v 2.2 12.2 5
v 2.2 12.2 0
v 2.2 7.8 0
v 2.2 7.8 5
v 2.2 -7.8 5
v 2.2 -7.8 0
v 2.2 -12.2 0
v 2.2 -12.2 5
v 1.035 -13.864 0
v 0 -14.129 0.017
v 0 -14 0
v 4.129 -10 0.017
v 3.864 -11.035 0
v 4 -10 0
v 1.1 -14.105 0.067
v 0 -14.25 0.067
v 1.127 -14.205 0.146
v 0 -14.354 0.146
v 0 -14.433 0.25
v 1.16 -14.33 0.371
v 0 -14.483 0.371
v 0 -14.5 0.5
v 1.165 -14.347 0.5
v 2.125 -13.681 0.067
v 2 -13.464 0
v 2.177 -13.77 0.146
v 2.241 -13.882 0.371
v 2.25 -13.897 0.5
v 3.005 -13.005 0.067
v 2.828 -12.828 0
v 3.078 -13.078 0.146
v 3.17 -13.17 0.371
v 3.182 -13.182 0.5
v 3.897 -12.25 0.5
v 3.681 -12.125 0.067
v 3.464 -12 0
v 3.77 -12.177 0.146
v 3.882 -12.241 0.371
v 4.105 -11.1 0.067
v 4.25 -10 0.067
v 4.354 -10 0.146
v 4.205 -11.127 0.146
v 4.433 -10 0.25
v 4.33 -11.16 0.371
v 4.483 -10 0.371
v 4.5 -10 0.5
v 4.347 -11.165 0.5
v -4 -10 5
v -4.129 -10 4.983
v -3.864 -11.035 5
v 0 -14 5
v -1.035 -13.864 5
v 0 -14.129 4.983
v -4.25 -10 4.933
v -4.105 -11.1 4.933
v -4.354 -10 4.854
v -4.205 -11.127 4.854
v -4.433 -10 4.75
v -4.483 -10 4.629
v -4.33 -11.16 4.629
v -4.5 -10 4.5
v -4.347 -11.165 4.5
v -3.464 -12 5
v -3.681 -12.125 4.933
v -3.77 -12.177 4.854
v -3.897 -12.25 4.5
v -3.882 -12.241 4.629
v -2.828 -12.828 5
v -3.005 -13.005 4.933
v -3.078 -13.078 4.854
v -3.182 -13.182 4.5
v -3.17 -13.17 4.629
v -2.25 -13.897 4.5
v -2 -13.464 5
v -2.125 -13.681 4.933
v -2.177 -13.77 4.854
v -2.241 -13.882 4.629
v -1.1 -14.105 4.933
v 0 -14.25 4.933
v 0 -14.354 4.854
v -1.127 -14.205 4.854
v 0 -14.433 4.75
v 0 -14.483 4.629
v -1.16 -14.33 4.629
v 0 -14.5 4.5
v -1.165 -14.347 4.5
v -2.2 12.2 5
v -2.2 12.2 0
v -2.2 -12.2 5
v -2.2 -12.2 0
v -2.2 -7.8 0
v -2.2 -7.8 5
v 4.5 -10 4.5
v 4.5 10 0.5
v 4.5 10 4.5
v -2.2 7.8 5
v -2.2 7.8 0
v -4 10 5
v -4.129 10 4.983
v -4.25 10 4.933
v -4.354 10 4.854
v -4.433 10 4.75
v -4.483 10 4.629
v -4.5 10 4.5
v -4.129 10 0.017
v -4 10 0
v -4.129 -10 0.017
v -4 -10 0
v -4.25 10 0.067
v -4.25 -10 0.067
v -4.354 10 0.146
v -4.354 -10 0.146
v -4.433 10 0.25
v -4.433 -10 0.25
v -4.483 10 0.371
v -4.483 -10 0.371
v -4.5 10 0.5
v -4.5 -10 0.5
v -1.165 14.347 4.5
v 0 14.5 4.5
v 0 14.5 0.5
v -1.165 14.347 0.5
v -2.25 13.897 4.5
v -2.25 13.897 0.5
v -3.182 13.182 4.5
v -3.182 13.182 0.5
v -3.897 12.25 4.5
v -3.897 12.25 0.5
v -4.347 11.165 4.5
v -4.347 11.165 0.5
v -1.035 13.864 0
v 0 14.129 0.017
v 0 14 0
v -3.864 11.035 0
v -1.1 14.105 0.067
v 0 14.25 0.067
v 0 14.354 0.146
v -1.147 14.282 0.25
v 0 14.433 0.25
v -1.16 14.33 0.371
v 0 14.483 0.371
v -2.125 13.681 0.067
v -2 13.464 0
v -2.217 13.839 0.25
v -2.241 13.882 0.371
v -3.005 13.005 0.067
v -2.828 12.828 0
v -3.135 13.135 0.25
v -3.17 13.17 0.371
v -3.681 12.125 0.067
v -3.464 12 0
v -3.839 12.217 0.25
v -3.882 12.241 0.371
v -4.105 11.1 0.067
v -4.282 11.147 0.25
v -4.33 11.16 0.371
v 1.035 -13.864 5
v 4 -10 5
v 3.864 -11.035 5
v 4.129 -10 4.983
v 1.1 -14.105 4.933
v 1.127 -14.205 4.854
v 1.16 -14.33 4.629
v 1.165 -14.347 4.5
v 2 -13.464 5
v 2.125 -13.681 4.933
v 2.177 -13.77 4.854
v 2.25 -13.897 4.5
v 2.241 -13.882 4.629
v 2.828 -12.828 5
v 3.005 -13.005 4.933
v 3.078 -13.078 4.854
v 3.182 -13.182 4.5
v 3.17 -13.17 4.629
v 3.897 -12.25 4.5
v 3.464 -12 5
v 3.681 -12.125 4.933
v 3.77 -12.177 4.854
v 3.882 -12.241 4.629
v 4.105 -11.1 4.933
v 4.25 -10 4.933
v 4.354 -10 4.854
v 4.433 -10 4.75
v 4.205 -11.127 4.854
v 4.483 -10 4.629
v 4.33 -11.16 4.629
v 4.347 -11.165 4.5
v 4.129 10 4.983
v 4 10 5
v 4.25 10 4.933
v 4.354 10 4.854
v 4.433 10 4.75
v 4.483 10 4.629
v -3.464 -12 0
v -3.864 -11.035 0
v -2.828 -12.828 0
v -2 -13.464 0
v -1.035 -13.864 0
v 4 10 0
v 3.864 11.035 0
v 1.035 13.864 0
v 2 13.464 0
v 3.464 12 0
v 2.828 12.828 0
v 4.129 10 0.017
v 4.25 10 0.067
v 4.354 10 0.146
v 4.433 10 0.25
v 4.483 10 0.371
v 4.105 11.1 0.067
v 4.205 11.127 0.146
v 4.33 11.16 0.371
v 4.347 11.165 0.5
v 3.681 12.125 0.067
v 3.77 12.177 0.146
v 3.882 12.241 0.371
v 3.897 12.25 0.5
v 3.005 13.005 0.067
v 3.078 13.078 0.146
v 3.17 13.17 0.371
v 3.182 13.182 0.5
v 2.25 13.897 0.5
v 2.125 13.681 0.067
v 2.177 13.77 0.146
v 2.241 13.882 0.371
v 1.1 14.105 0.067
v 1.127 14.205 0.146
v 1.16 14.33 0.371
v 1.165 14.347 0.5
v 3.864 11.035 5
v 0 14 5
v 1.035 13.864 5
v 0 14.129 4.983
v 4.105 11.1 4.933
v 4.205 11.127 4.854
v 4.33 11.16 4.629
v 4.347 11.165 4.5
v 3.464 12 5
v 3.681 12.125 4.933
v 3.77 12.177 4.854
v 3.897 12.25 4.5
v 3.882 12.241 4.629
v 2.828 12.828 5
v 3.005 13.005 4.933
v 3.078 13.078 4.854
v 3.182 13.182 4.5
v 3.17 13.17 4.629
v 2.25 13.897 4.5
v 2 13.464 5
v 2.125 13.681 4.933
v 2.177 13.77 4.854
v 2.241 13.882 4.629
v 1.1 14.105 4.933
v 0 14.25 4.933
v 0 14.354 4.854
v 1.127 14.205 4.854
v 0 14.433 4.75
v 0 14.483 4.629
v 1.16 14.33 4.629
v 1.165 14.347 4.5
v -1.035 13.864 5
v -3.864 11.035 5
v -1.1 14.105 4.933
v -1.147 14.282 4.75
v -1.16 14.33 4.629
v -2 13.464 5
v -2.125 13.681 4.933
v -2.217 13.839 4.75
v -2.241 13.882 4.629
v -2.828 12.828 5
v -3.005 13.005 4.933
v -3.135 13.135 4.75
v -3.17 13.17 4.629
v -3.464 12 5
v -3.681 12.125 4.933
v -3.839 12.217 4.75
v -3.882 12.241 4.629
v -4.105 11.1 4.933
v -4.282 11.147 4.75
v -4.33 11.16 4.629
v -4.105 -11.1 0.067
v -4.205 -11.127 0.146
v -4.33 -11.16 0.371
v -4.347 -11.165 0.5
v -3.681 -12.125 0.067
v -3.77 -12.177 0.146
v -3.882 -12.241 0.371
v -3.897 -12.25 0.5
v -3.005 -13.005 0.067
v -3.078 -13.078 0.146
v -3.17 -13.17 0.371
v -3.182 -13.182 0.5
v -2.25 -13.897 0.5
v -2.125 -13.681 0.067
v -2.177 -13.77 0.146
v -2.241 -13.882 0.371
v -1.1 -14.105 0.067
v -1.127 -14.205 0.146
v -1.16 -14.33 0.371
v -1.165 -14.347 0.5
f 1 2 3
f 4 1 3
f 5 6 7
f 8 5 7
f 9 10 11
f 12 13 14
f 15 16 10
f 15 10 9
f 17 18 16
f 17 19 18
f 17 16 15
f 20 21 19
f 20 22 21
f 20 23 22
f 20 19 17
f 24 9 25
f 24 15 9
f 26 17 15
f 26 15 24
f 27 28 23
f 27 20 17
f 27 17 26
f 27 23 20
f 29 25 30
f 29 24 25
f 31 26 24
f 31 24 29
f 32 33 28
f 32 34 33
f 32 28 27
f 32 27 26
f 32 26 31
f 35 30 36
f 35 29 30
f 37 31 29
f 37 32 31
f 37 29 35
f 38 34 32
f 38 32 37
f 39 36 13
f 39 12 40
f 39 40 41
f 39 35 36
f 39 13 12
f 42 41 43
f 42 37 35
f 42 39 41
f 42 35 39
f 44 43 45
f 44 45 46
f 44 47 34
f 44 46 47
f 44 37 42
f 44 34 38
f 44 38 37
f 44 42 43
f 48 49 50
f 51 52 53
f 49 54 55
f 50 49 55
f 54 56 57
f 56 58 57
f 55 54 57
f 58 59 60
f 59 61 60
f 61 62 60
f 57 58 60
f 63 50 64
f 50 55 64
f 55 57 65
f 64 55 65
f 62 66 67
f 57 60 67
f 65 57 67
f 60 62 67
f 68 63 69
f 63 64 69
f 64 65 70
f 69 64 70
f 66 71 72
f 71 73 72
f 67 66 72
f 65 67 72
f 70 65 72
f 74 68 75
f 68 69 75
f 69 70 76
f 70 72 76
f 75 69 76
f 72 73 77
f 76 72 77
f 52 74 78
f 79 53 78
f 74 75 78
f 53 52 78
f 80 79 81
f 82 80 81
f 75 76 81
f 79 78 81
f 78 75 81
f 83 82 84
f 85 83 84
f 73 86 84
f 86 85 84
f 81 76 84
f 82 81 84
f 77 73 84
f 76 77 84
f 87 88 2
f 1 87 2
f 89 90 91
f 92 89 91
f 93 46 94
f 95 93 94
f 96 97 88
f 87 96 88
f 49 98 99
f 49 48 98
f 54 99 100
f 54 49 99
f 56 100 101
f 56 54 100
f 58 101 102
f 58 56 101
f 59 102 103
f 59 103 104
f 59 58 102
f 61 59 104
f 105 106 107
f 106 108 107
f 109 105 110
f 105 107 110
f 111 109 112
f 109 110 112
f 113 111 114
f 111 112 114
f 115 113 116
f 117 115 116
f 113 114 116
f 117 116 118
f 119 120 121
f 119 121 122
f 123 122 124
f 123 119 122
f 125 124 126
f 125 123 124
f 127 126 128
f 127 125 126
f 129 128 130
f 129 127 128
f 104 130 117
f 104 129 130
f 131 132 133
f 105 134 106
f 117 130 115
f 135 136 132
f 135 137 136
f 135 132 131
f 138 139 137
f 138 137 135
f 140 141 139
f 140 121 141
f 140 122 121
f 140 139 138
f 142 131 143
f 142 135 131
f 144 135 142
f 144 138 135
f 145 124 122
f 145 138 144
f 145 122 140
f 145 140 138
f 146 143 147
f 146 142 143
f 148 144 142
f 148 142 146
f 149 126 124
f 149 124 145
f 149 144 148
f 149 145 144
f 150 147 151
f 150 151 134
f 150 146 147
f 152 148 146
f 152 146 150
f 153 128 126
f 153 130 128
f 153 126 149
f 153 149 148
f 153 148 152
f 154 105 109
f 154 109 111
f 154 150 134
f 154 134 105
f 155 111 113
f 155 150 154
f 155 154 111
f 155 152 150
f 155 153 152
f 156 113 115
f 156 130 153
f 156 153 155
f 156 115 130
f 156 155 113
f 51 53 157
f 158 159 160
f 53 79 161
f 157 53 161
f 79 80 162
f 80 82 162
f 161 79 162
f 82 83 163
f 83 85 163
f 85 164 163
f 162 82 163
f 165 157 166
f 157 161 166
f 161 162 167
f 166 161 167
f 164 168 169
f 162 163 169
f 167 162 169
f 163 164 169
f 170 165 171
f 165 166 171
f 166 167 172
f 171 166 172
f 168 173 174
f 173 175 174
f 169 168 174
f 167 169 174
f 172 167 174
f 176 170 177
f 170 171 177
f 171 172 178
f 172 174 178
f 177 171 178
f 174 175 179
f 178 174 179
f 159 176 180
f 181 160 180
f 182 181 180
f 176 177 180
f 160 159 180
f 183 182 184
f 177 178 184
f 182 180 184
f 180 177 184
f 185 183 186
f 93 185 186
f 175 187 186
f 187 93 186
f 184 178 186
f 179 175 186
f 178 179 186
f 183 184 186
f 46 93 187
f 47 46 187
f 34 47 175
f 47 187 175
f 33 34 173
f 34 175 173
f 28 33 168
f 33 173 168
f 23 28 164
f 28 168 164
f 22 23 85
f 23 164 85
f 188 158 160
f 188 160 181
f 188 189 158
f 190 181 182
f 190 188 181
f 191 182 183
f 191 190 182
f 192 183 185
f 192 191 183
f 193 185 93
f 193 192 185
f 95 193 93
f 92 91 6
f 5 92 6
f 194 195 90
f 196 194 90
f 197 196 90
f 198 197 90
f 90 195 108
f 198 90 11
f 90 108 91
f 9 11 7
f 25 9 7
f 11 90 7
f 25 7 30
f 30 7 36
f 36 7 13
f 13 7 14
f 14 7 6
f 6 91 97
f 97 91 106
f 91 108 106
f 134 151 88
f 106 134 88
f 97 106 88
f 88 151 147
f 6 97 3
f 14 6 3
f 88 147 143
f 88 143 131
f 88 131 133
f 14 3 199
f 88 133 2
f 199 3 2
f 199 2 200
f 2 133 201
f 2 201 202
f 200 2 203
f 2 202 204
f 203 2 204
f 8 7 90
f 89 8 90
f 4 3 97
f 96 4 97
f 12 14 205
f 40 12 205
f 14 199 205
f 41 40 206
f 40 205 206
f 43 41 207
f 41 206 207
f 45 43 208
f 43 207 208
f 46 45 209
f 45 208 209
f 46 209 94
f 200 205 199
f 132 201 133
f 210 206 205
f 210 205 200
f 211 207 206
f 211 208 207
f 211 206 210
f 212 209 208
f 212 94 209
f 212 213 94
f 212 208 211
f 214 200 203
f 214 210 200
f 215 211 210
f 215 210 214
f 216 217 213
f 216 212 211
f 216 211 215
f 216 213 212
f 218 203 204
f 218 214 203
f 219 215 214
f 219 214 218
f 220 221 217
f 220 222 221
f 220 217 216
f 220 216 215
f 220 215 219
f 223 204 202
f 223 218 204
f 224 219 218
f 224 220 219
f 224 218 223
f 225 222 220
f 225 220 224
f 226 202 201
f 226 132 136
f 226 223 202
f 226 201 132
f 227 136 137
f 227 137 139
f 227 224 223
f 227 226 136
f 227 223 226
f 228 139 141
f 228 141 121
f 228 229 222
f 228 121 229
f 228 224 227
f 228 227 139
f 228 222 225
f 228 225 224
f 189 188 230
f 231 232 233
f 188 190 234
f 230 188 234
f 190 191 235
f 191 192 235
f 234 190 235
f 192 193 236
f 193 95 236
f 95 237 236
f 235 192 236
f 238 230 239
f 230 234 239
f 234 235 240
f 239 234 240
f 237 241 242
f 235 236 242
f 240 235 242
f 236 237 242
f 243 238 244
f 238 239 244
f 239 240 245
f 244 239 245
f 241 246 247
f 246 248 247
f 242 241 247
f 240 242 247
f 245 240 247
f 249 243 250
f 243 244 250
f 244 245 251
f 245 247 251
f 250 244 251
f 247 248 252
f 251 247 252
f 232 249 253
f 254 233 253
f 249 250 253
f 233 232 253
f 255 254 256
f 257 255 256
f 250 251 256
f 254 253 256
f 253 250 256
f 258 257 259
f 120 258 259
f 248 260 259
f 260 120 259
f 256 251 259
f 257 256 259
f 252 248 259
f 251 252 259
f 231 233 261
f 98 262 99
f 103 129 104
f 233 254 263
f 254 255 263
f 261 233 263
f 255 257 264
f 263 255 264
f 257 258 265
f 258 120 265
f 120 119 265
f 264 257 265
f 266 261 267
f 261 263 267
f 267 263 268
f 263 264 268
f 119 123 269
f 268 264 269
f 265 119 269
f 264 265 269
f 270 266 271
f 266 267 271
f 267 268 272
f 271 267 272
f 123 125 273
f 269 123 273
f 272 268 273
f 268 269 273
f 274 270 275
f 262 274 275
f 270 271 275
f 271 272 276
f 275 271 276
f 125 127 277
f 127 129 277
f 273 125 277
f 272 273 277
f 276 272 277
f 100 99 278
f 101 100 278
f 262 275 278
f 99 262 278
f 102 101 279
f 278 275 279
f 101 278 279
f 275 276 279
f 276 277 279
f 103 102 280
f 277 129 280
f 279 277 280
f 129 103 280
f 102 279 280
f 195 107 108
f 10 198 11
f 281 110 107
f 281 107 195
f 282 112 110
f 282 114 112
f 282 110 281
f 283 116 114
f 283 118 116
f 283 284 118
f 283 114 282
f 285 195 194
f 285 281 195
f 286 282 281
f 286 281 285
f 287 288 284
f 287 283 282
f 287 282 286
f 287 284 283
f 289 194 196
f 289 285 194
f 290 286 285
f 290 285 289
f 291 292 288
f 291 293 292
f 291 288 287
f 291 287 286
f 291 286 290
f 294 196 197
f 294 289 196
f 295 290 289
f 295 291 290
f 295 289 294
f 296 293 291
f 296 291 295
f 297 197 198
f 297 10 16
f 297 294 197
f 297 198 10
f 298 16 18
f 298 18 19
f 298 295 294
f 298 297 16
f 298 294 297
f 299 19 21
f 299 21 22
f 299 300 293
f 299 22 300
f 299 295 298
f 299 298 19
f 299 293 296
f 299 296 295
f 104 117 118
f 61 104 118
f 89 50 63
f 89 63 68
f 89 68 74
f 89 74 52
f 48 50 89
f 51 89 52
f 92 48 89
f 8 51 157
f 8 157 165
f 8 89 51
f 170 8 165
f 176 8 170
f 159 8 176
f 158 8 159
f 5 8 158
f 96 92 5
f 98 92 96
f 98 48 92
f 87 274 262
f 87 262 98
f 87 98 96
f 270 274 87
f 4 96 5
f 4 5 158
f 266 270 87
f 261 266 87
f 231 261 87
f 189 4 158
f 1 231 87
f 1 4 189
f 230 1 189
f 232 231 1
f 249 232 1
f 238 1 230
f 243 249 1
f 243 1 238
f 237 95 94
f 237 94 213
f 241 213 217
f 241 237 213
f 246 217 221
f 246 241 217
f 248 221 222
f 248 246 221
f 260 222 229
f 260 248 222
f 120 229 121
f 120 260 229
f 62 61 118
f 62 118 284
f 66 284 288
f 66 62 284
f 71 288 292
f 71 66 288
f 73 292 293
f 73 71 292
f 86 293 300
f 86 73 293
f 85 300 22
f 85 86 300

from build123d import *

# Parameters (mm, degrees)
F1_DEPTH = 5
F2_R     = 4.49999
F3_R     = 0.5


# Not quite as in the source:
# - a fillet or chamfer is up to 0.001 mm smaller than in the source, because OpenCascade refuses the exact size


with BuildPart() as f1:
    # F0 (on Top) → F1 (new body)
    with BuildSketch(Plane.XY):
        Polygon((4.5, -14.5), (4.5, 14.5), (0, 14.5), (-4.5, 14.5), (-4.5, -14.5), (0, -14.5), align=None)
        Polygon((2.2, -12.2), (0, -12.2), (-2.2, -12.2), (-2.2, -7.8), (2.2, -7.8), align=None, mode=Mode.SUBTRACT)
        Polygon((-2.2, 12.2), (0, 12.2), (2.2, 12.2), (2.2, 7.8), (-2.2, 7.8), align=None, mode=Mode.SUBTRACT)
    extrude(amount=F1_DEPTH)

    # F2 (radius 4.5 in the source; OpenCascade refuses exactly that, so slightly less here)
    f2_edges = [f1.edges().sort_by_distance(p)[0] for p in [
        (-4.5, 14.5, 2.5),
        (4.5, 14.5, 2.5),
        (4.5, -14.5, 2.5),
        (-4.5, -14.5, 2.5),
    ]]
    fillet(f2_edges, radius=F2_R)

    # F3
    f3_edges = [f1.edges().sort_by_distance(p)[0] for p in [
        (-4.5, 0, 5),
        (-4.5, 0, 0),
    ]]
    fillet(f3_edges, radius=F3_R)


solid = f1.part
